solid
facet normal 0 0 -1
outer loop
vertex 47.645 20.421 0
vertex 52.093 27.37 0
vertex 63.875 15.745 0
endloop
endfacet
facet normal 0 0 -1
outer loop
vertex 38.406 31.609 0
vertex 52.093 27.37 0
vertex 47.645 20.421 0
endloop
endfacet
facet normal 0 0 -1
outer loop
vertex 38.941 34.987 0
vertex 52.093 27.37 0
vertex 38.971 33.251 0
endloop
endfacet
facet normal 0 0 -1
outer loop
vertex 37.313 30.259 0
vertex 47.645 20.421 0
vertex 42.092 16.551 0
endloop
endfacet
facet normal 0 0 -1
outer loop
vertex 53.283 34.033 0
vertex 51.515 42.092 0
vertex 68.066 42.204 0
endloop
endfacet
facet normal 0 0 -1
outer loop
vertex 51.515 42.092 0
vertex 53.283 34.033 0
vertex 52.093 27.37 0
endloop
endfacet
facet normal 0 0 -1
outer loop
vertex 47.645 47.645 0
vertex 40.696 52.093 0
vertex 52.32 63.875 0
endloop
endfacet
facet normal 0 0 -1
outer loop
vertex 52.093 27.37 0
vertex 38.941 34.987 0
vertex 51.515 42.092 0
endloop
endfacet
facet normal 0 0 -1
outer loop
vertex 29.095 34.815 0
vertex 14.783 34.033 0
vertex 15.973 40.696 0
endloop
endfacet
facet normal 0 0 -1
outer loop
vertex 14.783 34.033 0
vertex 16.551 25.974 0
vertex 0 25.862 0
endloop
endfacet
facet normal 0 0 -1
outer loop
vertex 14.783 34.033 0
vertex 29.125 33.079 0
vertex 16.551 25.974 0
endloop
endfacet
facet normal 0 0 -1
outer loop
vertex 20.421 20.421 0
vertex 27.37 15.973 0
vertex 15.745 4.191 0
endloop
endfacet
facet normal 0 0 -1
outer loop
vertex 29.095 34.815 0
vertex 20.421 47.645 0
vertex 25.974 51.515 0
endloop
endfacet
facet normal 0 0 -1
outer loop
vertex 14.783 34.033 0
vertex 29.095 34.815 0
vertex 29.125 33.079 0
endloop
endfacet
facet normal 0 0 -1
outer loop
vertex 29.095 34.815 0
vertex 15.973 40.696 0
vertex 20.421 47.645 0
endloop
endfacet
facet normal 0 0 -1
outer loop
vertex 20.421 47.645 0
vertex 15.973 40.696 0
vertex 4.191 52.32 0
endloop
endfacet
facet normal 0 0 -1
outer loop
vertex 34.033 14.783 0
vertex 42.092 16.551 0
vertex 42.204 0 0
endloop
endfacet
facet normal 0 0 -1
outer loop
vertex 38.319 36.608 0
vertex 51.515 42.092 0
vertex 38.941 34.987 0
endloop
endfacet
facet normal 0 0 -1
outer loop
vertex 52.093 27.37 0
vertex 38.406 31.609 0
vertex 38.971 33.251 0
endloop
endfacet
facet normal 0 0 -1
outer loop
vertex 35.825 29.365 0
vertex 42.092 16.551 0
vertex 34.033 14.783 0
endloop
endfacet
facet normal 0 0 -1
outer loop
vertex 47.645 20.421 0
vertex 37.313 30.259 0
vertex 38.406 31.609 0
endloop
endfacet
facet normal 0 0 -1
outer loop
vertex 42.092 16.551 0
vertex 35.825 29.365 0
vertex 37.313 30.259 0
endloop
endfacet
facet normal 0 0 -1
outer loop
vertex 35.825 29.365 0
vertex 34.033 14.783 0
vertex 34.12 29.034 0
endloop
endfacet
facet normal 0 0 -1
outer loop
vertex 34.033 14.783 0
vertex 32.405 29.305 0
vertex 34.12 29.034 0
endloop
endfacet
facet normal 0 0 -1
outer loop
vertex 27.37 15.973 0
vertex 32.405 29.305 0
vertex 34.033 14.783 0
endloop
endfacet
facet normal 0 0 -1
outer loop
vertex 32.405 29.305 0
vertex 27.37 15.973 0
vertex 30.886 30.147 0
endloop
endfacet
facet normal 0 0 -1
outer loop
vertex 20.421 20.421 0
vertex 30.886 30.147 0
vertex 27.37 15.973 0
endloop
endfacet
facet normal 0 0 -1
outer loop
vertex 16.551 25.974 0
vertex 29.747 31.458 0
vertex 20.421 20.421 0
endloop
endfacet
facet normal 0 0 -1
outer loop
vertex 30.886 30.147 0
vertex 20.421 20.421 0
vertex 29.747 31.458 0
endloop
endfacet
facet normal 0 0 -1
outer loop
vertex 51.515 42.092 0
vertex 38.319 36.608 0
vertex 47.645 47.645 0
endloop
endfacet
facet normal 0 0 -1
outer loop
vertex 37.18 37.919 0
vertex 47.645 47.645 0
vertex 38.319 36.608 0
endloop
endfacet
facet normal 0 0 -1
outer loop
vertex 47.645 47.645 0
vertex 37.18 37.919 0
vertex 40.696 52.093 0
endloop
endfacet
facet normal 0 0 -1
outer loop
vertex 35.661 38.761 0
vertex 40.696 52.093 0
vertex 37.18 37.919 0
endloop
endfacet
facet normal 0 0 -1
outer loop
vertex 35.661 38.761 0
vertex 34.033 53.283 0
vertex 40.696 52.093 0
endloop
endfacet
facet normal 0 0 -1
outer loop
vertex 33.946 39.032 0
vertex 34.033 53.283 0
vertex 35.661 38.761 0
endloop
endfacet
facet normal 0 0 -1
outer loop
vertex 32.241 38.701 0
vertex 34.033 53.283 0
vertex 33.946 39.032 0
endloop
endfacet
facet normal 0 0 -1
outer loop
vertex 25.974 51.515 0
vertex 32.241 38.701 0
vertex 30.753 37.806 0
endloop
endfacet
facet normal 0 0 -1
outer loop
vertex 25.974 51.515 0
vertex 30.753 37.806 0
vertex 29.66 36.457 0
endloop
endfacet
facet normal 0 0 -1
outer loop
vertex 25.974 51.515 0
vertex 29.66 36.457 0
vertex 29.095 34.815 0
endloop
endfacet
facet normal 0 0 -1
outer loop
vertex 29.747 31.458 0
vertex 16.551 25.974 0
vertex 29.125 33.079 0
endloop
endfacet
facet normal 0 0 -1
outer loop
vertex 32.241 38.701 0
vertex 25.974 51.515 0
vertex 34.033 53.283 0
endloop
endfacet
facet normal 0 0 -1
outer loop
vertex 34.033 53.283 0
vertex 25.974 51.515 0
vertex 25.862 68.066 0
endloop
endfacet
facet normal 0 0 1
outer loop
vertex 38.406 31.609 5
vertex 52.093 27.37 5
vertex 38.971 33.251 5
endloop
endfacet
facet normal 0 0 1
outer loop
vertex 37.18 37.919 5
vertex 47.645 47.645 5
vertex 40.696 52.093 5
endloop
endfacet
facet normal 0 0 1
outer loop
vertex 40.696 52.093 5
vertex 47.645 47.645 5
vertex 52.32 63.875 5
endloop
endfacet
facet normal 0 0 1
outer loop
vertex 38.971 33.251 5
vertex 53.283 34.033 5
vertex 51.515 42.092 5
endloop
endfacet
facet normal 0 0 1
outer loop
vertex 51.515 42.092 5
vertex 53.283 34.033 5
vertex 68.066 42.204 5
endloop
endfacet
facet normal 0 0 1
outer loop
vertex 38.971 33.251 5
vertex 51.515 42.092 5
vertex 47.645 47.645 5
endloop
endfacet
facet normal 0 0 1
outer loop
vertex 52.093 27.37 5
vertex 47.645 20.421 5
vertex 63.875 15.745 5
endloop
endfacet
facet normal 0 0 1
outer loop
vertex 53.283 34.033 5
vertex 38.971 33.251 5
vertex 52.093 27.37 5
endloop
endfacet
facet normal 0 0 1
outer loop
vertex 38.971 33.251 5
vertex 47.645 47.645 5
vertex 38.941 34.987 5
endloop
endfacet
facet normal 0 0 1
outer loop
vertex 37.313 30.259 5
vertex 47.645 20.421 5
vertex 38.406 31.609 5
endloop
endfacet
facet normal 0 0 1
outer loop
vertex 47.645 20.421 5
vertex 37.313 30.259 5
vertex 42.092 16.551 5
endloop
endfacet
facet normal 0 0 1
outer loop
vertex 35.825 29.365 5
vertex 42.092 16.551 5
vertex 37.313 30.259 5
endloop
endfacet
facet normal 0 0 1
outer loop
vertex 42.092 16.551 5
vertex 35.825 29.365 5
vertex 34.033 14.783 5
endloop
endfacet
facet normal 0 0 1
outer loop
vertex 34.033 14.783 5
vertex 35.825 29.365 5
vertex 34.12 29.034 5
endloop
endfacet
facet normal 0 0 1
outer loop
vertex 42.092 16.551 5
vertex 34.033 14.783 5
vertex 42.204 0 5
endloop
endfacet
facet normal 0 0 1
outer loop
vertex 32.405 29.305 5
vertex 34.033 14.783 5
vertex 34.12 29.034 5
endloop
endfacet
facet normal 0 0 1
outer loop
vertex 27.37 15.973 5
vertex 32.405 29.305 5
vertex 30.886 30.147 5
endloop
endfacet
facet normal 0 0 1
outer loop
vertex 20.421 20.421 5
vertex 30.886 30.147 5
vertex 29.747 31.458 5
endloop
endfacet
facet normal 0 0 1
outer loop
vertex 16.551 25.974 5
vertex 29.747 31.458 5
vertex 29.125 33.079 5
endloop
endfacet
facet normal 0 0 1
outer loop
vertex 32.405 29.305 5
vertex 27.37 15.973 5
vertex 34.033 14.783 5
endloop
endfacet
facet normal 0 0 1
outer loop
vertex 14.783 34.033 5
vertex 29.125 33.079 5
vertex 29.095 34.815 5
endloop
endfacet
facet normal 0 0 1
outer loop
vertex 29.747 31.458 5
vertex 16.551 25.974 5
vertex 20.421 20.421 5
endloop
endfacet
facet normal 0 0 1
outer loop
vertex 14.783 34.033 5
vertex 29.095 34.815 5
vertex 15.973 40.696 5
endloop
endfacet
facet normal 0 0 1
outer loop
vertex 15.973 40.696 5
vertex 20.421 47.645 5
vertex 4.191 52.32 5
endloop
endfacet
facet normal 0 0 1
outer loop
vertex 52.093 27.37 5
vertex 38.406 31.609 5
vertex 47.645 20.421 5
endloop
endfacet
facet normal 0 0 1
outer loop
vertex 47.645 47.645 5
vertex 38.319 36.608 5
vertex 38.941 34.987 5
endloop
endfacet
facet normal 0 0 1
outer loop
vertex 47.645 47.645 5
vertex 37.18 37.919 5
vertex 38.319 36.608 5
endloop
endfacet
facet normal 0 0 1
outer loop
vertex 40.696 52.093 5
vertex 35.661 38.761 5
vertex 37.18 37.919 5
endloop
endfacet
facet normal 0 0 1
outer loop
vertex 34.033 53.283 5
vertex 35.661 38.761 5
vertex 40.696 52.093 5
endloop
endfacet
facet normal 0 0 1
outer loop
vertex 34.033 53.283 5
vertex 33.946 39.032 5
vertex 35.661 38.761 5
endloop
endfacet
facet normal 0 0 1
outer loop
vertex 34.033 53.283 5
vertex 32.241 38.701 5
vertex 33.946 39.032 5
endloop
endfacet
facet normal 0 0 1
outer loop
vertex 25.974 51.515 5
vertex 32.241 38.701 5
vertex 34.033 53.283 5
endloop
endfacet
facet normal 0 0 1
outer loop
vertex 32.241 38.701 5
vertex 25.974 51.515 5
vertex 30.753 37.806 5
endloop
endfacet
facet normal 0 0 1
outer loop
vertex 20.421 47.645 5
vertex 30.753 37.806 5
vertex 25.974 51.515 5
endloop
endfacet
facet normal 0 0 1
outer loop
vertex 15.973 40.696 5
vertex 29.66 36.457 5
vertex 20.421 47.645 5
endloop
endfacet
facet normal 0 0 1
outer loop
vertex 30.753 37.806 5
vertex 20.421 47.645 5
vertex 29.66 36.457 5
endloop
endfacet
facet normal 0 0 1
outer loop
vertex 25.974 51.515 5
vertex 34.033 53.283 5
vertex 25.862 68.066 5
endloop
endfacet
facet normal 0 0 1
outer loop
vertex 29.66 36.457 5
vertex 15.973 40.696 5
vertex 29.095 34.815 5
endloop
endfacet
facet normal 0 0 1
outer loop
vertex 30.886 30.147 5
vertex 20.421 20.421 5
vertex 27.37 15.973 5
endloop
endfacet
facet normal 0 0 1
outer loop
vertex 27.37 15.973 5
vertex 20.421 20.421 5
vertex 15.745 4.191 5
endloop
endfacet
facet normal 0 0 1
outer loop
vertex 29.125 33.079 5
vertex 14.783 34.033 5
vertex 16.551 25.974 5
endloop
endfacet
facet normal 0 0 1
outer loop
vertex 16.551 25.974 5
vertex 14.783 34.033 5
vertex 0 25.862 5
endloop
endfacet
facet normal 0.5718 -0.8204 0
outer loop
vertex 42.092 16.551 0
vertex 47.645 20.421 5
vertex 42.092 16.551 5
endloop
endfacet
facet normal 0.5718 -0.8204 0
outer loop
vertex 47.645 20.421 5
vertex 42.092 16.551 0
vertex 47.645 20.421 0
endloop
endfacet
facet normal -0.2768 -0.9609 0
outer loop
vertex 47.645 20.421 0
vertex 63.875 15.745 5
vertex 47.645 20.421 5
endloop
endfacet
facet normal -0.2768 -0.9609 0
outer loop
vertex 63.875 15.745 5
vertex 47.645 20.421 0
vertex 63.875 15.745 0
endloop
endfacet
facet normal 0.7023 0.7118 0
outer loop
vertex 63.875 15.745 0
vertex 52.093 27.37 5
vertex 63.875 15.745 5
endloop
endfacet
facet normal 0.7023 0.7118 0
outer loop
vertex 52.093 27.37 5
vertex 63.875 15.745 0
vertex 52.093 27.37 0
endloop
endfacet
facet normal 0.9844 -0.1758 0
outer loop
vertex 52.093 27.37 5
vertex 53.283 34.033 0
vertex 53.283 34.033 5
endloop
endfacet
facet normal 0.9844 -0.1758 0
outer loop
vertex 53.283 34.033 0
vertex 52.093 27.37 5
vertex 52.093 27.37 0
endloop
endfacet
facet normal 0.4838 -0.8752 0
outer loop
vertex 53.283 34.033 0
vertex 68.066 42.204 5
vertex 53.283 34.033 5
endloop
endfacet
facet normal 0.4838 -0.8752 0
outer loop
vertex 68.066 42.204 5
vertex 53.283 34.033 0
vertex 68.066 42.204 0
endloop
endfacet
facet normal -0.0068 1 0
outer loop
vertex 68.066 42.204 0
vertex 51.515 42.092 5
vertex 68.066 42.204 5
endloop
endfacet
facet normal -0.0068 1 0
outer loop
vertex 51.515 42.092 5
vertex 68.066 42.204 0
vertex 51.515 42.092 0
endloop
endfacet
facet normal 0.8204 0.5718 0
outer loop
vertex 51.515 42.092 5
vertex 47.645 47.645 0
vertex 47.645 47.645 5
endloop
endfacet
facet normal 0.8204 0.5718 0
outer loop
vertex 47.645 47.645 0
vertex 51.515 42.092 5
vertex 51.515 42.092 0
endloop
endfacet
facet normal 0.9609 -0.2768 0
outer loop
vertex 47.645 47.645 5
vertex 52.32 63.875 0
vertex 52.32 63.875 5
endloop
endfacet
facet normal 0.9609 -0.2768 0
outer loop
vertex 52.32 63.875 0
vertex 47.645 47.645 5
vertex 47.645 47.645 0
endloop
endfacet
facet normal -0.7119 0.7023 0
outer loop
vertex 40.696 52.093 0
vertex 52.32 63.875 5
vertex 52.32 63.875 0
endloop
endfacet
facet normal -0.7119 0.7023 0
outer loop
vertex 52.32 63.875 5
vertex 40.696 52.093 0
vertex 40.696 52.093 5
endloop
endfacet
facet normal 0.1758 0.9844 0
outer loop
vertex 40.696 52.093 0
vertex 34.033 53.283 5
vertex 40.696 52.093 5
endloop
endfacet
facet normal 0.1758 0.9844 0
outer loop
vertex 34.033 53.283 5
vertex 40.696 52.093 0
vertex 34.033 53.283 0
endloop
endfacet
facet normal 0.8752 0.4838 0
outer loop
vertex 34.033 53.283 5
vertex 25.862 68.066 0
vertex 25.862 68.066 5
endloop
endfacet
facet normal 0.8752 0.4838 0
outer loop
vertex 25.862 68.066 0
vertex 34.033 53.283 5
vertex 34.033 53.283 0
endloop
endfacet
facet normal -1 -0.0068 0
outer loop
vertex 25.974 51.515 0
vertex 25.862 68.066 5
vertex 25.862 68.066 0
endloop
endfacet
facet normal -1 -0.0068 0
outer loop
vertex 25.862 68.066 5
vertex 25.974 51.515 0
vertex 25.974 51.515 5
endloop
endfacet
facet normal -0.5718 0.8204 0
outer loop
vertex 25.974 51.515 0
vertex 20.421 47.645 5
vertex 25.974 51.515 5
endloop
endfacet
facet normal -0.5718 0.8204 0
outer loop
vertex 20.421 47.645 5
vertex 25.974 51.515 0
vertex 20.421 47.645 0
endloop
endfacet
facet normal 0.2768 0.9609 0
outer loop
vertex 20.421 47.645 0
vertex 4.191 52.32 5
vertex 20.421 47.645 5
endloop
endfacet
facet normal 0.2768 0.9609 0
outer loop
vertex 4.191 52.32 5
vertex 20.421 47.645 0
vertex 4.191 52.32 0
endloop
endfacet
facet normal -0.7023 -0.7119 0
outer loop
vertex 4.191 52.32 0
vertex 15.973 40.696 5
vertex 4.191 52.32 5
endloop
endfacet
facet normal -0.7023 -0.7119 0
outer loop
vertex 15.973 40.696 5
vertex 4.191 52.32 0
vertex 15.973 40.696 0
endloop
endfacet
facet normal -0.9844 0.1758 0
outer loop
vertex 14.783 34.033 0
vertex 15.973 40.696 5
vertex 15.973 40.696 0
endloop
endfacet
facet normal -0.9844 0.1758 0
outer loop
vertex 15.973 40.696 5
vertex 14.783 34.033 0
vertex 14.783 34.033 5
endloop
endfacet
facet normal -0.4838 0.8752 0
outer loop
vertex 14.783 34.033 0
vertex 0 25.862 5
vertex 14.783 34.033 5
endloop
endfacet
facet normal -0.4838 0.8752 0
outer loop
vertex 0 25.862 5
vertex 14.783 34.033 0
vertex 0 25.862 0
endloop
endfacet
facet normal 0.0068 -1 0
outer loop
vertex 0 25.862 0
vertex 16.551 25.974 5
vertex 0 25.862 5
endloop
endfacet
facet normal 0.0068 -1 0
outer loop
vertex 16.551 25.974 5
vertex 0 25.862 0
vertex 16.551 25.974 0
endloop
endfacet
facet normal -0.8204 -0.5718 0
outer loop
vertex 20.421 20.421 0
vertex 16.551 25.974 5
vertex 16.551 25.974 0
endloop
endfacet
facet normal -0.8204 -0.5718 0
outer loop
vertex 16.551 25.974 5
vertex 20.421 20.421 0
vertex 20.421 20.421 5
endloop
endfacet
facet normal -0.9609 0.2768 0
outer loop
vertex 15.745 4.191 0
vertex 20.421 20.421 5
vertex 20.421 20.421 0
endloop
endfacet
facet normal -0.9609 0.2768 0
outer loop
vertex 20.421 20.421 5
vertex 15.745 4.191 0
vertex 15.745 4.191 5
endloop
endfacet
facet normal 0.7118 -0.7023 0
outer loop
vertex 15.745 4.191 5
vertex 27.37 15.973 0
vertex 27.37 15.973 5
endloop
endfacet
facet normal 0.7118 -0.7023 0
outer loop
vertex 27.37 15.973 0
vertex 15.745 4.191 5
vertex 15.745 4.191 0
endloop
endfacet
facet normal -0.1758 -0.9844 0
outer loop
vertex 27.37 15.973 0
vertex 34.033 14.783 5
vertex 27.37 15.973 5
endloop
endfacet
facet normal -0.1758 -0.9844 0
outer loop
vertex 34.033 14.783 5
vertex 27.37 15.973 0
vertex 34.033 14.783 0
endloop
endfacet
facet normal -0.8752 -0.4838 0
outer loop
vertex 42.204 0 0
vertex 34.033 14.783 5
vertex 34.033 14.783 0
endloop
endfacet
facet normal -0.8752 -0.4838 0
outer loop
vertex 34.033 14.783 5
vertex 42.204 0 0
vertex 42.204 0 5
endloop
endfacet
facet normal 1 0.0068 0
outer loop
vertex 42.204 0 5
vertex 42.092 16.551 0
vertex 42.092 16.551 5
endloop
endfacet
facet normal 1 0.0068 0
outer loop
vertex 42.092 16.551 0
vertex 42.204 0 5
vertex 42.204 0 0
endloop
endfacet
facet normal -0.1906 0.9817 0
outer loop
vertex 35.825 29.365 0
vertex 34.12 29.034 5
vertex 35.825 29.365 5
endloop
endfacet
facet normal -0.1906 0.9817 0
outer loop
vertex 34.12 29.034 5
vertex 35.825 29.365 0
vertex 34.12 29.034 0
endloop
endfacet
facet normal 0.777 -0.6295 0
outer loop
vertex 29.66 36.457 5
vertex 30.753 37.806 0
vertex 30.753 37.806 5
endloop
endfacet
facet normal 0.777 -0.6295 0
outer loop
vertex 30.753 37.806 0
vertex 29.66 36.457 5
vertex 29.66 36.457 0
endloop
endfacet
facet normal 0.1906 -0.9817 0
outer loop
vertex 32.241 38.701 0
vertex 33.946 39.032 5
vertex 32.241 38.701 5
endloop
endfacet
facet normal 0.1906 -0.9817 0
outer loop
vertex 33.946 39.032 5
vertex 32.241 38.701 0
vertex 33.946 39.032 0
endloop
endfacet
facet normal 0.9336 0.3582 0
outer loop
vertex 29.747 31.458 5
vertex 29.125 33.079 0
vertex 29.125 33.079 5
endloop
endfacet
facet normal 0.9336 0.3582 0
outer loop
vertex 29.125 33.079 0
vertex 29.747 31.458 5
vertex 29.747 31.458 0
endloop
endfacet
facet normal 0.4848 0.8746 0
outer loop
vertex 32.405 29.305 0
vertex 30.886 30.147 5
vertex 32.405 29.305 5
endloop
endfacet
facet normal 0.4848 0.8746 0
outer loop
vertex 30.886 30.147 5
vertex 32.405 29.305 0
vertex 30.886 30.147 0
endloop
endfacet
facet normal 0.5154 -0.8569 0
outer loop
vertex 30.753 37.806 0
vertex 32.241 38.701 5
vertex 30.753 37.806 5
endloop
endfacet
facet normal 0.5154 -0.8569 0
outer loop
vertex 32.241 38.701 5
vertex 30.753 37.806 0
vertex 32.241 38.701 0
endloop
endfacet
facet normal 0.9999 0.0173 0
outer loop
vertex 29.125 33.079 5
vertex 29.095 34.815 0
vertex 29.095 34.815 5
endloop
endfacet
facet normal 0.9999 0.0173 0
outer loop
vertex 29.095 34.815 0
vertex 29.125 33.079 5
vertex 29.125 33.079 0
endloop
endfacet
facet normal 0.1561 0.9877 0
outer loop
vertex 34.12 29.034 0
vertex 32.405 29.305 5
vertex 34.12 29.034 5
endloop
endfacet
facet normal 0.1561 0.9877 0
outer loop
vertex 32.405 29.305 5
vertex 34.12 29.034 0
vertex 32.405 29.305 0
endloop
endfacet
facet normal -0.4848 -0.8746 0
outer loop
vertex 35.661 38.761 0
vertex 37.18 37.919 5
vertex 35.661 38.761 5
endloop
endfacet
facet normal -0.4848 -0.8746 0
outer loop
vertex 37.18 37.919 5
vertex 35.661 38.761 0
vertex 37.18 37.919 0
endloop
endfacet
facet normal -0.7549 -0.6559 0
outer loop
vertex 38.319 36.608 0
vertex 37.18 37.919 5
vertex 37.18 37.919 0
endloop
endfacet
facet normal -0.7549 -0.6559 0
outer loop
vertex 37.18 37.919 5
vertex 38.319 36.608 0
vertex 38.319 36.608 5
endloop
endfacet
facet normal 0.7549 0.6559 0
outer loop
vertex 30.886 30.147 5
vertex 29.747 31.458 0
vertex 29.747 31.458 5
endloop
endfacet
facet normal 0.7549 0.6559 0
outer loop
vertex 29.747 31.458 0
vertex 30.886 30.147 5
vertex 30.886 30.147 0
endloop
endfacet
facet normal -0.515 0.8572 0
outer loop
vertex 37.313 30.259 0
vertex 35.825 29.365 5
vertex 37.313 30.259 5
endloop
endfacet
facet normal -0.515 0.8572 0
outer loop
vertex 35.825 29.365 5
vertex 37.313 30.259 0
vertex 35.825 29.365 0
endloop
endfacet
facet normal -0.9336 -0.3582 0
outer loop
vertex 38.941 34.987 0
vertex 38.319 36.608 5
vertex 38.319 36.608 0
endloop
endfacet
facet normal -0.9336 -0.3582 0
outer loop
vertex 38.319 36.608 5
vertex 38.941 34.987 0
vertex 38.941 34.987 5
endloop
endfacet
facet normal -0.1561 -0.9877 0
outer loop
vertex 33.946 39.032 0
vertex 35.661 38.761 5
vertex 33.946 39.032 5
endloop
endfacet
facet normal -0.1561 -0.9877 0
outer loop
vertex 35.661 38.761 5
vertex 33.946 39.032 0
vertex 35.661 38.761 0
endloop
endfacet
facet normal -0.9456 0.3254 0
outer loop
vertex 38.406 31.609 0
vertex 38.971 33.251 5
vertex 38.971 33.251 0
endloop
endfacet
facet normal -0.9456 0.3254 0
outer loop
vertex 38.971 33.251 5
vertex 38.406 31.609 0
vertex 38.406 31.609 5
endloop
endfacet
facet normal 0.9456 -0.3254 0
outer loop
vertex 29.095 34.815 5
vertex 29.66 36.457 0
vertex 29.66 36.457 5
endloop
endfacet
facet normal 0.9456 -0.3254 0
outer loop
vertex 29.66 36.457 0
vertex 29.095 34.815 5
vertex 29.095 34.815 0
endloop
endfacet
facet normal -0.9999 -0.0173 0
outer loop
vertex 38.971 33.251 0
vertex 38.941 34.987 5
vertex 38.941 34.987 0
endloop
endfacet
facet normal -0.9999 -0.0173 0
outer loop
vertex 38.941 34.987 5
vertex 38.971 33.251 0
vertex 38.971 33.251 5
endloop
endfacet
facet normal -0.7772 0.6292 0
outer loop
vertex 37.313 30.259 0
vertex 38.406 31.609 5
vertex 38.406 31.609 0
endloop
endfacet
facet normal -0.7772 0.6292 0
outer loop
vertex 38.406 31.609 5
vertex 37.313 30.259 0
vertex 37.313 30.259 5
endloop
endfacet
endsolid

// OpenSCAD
$fn = 32;

// ----------------------------------------------------------------------
// Star wheel: 8-point ratchet, R35
// ----------------------------------------------------------------------

// --- parameters (mm) ---
n_points = 8;             // number of points / teeth
r_out = 35;               // tip radius
r_in = 19.25;             // root radius
bore_r = 5;               // centre bore radius
plate_t = 5;              // plate thickness, Z (extrusion height)
bore_d = 10;              // centre bore diameter

profile = [[34.033, 53.283], [25.862, 68.066], [25.974, 51.515], [20.421, 47.645], [4.191, 52.32], [15.973, 40.696], [14.783, 34.033], [0, 25.862], [16.551, 25.974], [20.421, 20.421], [15.745, 4.191], [27.37, 15.973], [34.033, 14.783], [42.204, 0], [42.092, 16.551], [47.645, 20.421], [63.875, 15.745], [52.093, 27.37], [53.283, 34.033], [68.066, 42.204], [51.515, 42.092], [47.645, 47.645], [52.32, 63.875], [40.696, 52.093]];  // primary outline, 24 points, counter clockwise
void_1 = [[38.941, 34.987], [38.319, 36.608], [37.18, 37.919], [35.661, 38.761], [33.946, 39.032], [32.241, 38.701], [30.753, 37.806], [29.66, 36.457], [29.095, 34.815], [29.125, 33.079], [29.747, 31.458], [30.886, 30.147], [32.405, 29.305], [34.12, 29.034], [35.825, 29.365], [37.313, 30.259], [38.406, 31.609], [38.971, 33.251]];  // centre bore, 18 points

// --- the one profile operation ---
difference() {
  linear_extrude(height = plate_t) polygon(points = profile);
  translate([0, 0, -1])
    linear_extrude(height = plate_t + 2) polygon(points = void_1);
}
